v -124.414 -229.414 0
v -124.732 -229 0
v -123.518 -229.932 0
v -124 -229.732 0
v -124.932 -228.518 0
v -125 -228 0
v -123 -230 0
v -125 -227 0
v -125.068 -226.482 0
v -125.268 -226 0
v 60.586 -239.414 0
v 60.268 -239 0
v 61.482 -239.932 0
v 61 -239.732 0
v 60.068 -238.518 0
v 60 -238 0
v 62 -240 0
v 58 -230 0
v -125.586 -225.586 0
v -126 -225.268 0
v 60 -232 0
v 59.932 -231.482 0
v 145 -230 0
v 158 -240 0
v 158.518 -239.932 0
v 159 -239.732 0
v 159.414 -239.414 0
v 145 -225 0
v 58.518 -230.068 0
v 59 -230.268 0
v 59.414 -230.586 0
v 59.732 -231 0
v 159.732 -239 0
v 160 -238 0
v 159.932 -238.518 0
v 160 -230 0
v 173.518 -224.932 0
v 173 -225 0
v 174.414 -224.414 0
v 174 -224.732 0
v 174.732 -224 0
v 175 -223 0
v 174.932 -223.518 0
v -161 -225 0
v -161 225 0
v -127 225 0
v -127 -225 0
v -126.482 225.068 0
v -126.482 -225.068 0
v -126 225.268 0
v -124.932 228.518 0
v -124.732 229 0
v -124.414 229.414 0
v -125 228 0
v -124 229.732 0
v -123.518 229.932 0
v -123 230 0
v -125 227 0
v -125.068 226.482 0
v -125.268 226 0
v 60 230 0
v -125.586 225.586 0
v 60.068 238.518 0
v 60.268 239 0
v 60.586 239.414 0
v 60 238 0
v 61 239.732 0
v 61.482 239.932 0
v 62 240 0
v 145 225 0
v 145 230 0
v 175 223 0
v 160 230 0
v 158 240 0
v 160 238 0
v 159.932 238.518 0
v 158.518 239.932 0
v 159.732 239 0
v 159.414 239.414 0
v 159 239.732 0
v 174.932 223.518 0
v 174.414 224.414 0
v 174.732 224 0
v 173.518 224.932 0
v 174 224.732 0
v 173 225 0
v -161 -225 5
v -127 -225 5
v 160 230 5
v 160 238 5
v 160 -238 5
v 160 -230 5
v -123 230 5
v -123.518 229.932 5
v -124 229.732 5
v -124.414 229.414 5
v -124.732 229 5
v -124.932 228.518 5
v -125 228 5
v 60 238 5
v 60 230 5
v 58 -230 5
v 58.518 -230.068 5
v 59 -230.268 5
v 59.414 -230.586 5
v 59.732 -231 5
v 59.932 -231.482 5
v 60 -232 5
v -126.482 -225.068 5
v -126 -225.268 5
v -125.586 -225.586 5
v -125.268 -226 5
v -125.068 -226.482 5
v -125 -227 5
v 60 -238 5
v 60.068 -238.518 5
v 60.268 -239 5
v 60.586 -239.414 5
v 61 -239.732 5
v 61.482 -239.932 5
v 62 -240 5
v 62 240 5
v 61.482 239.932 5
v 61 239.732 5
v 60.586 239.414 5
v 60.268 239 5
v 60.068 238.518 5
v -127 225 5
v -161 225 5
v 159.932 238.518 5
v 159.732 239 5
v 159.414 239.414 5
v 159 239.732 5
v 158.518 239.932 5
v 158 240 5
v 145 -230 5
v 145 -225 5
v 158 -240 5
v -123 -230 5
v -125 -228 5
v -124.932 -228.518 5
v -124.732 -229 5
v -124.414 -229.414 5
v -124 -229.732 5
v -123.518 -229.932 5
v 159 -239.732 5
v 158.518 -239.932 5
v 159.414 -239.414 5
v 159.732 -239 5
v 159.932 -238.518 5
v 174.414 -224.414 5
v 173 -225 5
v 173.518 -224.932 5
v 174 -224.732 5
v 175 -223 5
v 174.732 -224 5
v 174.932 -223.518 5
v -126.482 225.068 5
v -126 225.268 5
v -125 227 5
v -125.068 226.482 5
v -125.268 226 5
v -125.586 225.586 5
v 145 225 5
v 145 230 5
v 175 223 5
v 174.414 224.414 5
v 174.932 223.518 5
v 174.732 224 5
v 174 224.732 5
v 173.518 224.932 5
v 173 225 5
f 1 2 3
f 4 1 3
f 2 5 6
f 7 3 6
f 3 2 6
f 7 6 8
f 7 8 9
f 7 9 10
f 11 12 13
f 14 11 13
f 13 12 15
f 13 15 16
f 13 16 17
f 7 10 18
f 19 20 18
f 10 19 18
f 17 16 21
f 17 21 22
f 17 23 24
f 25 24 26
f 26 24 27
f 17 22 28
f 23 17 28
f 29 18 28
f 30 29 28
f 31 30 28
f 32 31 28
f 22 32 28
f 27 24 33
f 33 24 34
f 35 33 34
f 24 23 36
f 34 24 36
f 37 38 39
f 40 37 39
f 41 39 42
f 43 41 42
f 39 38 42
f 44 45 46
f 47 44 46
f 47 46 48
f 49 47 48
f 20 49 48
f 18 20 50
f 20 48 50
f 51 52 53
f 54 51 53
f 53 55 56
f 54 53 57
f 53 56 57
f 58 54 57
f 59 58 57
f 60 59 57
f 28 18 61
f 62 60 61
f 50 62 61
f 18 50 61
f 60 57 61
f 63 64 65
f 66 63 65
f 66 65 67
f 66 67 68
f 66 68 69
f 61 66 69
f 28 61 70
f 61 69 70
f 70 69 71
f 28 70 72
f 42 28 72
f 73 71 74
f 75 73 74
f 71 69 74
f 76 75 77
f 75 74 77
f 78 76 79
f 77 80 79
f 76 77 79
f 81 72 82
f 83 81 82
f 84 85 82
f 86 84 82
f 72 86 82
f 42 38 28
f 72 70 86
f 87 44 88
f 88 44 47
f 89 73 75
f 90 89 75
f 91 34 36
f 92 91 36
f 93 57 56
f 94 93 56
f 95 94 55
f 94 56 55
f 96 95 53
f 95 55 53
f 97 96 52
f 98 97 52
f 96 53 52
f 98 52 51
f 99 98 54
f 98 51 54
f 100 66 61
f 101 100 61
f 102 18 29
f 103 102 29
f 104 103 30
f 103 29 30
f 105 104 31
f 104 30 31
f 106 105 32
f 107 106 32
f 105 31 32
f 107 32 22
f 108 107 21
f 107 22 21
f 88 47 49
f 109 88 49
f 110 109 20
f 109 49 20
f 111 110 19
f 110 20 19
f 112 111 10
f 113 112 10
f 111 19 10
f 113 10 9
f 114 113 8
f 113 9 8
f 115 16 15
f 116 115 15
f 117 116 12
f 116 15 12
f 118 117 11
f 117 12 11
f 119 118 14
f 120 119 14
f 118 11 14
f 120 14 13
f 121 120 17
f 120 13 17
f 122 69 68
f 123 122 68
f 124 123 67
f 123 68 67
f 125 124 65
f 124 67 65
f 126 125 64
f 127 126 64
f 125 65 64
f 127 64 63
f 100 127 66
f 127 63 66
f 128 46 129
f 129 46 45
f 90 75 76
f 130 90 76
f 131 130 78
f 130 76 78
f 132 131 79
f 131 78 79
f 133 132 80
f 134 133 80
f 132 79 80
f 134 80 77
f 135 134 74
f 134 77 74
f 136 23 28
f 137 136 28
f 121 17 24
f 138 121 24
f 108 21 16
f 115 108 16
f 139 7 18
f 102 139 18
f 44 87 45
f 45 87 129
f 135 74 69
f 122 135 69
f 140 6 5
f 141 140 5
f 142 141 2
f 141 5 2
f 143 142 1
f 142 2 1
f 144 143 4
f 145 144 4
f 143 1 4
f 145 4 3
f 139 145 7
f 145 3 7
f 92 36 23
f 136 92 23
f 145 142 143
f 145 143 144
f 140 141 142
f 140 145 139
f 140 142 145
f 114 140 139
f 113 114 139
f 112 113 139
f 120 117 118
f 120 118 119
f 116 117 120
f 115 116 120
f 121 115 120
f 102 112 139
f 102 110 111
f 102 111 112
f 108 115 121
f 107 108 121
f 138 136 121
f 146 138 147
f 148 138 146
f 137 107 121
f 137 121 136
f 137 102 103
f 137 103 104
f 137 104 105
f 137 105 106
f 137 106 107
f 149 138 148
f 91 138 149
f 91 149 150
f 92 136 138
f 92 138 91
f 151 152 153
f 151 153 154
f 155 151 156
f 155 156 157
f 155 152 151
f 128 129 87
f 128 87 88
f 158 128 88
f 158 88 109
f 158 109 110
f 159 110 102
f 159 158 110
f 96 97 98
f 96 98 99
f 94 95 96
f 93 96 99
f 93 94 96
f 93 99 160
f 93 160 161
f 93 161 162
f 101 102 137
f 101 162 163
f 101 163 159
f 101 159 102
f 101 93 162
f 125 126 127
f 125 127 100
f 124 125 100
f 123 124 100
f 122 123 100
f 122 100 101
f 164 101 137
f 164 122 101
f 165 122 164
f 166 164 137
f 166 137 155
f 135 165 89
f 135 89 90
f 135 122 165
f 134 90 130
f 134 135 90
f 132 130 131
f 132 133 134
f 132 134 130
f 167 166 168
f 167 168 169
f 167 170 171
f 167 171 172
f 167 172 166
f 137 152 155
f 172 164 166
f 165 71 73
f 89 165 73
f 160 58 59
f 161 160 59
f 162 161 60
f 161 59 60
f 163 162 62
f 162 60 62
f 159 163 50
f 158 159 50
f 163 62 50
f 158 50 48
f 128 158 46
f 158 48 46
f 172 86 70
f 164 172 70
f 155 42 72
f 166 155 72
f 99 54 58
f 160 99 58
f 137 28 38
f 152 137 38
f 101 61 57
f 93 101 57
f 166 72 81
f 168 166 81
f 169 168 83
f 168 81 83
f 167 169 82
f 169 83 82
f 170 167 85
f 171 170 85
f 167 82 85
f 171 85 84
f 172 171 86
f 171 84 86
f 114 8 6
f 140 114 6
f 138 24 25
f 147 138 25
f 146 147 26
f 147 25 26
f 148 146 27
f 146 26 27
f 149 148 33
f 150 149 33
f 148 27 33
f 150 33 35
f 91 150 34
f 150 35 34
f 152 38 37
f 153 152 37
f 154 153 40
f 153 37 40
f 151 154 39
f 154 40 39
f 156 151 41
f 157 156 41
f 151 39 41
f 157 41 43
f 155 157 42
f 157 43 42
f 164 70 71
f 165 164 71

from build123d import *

# Parameters (mm, degrees)
F1_DEPTH = 5
F3_DEPTH = 25


with BuildPart() as f1:
    # F0 (on Top) → F1 (new body)
    with BuildSketch(Plane.XY):
        with BuildLine():
            Line((145, -225), (173, -225))
            ThreePointArc((173, -225), (174.4142135624, -224.4142135624), (175, -223))
            Line((175, -223), (175, 223))
            ThreePointArc((175, 223), (174.4142135624, 224.4142135624), (173, 225))
            Line((173, 225), (145, 225))
            Line((145, 225), (145, 230))
            Line((145, 230), (160, 230))
            Line((160, 230), (160, 238))
            ThreePointArc((160, 238), (159.4142135624, 239.4142135624), (158, 240))
            Line((158, 240), (62, 240))
            ThreePointArc((62, 240), (60.5857864376, 239.4142135624), (60, 238))
            Line((60, 238), (60, 230))
            Line((60, 230), (-123, 230))
            ThreePointArc((-123, 230), (-124.4142135624, 229.4142135624), (-125, 228))
            Line((-125, 228), (-125, 227))
            ThreePointArc((-125, 227), (-125.5857864376, 225.5857864376), (-127, 225))
            Line((-127, 225), (-173, 225))
            ThreePointArc((-173, 225), (-174.4142135624, 224.4142135624), (-175, 223))
            Line((-175, 223), (-175, -223))
            ThreePointArc((-175, -223), (-174.4142135624, -224.4142135624), (-173, -225))
            Line((-173, -225), (-127, -225))
            ThreePointArc((-127, -225), (-125.5857864376, -225.5857864376), (-125, -227))
            Line((-125, -227), (-125, -228))
            ThreePointArc((-125, -228), (-124.4142135624, -229.4142135624), (-123, -230))
            Line((-123, -230), (58, -230))
            ThreePointArc((58, -230), (59.4142135624, -230.5857864376), (60, -232))
            Line((60, -232), (60, -238))
            ThreePointArc((60, -238), (60.5857864376, -239.4142135624), (62, -240))
            Line((62, -240), (158, -240))
            ThreePointArc((158, -240), (159.4142135624, -239.4142135624), (160, -238))
            Line((160, -238), (160, -230))
            Line((160, -230), (145, -230))
            Line((145, -230), (145, -225))
        make_face()
    extrude(amount=F1_DEPTH)

    # F2 (on face) → F3 (cut)
    with BuildSketch(Plane.XY.offset(5)):
        with BuildLine():
            Line((-161, 225), (-161, 340.5782580579))
            Line((-161, 340.5782580579), (-227.952612991, 340.5782580579))
            Line((-227.952612991, 340.5782580579), (-227.952612991, -338.3395225013))
            Line((-227.952612991, -338.3395225013), (-161, -338.3395225013))
            Line((-161, -338.3395225013), (-161, -225))
            Line((-161, -225), (-173, -225))
            ThreePointArc((-173, -225), (-174.4142135624, -224.4142135624), (-175, -223))
            Line((-175, -223), (-175, 223))
            ThreePointArc((-175, 223), (-174.4142135624, 224.4142135624), (-173, 225))
            Line((-173, 225), (-161, 225))
        make_face()
        with BuildLine():
            Line((-161, -225), (-161, 225))
            Line((-161, 225), (-173, 225))
            ThreePointArc((-173, 225), (-174.4142135624, 224.4142135624), (-175, 223))
            Line((-175, 223), (-175, -223))
            ThreePointArc((-175, -223), (-174.4142135624, -224.4142135624), (-173, -225))
            Line((-173, -225), (-161, -225))
        make_face()
    extrude(amount=-F3_DEPTH, mode=Mode.SUBTRACT)


solid = f1.part
